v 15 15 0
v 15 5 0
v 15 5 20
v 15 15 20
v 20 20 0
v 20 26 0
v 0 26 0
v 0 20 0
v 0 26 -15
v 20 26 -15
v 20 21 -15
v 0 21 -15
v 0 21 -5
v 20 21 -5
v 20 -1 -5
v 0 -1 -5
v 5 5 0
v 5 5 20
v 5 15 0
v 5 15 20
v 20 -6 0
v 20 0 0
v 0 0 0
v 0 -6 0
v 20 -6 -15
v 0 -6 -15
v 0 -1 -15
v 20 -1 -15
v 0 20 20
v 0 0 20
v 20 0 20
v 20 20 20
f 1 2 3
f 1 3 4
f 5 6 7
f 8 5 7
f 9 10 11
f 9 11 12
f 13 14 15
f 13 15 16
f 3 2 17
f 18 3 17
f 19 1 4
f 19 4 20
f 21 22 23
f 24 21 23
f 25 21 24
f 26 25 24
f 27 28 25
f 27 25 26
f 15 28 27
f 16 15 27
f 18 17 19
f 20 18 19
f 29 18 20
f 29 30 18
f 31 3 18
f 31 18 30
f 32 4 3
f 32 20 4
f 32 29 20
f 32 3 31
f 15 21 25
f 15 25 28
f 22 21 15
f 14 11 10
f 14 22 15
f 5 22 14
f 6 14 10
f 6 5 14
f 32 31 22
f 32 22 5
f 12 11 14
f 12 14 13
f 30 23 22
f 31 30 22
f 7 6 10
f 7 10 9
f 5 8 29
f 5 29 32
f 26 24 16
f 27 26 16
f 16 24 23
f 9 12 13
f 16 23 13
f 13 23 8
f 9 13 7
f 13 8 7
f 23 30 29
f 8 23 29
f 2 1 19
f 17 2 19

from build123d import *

# Parameters (mm, degrees)
SKETCH_1_W          = 20
SKETCH_1_H          = 20
EXTRUDE_1_DEPTH     = 20
SKETCH_3_W          = 10
SKETCH_3_H          = 10
CUT_EXTRUDE_1_DEPTH = 20
SKETCH_4_W          = 20
SKETCH_4_H          = 32
EXTRUDE_2_DEPTH     = 15
SKETCH_5_W          = 20
SKETCH_5_H          = 22
CUT_EXTRUDE_2_DEPTH = 10


with BuildPart() as part:
    # 草图1 → 凸台-拉伸1 (new body)
    with BuildSketch(Plane.XY):
        with Locations((10, 10)):
            Rectangle(SKETCH_1_W, SKETCH_1_H)
    extrude(amount=EXTRUDE_1_DEPTH)

    # 草图3 → 切除-拉伸1 (cut)
    with BuildSketch(Plane(origin=(0, 0, 0), x_dir=(-1, 0, 0), z_dir=(0, 0, -1))):
        with Locations((-10, 10)):
            Rectangle(SKETCH_3_W, SKETCH_3_H)
    extrude(amount=-CUT_EXTRUDE_1_DEPTH, mode=Mode.SUBTRACT)

    # 草图4 → 凸台-拉伸2 (add)
    with BuildSketch(Plane(origin=(0, 0, 0), x_dir=(-1, 0, 0), z_dir=(0, 0, -1))):
        with Locations((-10, 10)):
            Rectangle(SKETCH_4_W, SKETCH_4_H)
    extrude(amount=EXTRUDE_2_DEPTH)

    # 草图5 → 切除-拉伸2 (cut)
    with BuildSketch(Plane(origin=(0, 0, -15), x_dir=(-1, 0, 0), z_dir=(0, 0, -1))):
        with Locations((-10, 10)):
            Rectangle(SKETCH_5_W, SKETCH_5_H)
    extrude(amount=-CUT_EXTRUDE_2_DEPTH, mode=Mode.SUBTRACT)


solid = part.part
